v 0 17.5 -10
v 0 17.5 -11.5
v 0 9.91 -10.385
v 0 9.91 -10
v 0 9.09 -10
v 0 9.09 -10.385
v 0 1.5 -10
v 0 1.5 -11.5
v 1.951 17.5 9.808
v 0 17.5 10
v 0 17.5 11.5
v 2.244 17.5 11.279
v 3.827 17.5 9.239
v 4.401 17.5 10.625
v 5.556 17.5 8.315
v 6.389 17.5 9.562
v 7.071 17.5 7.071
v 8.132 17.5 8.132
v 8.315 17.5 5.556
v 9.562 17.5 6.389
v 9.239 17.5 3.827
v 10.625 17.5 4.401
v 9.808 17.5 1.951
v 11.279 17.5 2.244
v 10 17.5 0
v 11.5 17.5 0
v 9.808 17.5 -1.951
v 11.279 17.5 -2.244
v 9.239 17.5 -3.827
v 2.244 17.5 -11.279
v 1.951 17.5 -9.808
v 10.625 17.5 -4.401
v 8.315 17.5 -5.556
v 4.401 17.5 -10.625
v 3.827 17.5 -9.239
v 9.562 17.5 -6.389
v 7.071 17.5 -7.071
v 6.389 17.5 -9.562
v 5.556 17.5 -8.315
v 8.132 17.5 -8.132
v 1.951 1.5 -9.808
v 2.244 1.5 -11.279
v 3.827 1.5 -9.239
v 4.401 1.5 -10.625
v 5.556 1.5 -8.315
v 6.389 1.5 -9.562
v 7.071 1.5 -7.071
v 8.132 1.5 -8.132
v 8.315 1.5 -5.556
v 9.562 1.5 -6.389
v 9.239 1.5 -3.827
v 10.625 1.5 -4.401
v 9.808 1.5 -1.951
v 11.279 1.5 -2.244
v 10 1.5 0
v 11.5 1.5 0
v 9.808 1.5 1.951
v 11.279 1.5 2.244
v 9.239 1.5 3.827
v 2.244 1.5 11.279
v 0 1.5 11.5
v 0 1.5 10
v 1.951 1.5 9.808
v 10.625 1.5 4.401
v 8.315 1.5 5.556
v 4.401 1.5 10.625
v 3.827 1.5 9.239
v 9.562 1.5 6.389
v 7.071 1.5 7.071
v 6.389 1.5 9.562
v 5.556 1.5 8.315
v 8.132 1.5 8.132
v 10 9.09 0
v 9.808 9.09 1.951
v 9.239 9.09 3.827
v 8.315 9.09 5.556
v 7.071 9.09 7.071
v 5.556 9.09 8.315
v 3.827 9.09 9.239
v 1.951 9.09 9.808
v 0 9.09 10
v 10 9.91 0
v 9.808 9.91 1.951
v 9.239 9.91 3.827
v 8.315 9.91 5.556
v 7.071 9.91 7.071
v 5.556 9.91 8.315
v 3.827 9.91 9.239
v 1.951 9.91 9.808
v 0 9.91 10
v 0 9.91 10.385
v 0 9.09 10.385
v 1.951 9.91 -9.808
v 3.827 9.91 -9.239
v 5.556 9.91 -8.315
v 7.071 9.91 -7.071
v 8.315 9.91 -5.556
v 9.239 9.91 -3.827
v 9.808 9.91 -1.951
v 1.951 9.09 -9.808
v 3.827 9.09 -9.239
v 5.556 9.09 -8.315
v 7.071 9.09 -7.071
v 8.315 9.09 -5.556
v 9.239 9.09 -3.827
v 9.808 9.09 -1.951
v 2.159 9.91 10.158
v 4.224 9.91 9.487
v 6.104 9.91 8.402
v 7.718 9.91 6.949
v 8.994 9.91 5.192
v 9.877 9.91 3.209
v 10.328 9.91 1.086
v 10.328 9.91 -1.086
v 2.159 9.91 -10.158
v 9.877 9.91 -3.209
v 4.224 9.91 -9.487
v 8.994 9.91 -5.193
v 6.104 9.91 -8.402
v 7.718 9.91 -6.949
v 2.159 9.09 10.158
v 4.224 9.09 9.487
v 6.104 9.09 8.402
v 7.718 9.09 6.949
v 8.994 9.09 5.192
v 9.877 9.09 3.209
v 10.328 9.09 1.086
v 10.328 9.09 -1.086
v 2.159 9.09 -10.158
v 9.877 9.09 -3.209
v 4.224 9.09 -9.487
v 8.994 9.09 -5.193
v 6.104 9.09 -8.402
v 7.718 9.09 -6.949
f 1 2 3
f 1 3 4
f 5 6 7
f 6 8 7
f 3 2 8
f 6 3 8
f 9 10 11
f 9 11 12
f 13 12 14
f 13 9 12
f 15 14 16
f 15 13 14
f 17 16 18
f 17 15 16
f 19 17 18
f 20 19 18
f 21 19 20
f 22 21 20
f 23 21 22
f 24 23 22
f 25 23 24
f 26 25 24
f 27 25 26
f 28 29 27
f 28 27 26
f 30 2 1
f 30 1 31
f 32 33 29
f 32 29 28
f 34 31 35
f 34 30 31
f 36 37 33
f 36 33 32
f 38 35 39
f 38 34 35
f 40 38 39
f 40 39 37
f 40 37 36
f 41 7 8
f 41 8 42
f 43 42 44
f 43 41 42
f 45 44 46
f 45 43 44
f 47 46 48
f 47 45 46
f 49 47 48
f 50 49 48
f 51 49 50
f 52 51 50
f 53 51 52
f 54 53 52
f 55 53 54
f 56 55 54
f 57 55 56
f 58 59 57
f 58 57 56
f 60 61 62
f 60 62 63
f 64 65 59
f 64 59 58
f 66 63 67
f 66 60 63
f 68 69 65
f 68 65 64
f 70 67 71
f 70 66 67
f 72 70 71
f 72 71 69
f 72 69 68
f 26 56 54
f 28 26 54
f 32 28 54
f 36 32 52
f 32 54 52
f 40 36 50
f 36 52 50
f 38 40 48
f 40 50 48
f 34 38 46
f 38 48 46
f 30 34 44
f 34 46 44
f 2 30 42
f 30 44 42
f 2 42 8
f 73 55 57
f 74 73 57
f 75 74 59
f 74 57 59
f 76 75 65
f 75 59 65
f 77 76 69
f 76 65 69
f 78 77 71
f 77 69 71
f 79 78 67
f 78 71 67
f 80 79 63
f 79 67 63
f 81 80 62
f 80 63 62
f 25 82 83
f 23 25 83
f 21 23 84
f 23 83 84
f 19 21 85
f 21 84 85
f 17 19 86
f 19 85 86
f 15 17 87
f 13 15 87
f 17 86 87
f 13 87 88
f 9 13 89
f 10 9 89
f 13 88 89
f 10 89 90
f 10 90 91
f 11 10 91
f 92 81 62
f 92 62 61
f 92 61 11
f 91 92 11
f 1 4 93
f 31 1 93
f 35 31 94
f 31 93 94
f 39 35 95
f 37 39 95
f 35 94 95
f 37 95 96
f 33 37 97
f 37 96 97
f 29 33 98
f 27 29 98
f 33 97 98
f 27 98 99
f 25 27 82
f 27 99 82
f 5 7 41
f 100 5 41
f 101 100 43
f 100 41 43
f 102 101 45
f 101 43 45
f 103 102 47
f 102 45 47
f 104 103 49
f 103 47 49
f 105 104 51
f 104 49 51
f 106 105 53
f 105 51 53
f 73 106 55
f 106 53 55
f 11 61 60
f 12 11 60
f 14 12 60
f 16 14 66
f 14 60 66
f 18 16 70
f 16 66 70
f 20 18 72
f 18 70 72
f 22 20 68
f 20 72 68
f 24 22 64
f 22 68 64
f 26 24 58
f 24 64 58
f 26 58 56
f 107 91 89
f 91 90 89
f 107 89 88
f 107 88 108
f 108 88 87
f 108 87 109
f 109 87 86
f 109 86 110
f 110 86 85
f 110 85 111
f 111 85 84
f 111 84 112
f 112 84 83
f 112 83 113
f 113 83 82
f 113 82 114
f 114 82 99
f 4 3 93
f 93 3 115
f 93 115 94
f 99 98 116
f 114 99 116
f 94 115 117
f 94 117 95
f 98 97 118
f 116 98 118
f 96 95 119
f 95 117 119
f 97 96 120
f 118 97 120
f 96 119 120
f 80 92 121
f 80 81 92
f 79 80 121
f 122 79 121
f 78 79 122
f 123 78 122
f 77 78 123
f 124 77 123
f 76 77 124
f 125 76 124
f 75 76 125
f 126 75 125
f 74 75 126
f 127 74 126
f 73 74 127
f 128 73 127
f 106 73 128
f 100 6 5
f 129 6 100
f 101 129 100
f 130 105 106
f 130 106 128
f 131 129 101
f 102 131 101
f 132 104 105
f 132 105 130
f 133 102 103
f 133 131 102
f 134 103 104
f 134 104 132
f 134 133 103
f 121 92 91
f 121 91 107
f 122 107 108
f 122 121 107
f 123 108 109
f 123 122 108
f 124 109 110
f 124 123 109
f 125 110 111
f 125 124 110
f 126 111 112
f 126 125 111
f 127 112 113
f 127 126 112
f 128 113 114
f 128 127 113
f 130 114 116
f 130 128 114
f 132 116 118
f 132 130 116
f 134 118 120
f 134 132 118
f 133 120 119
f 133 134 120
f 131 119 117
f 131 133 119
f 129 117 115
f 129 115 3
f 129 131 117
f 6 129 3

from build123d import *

# Parameters (mm, degrees)
BOSS_EXTRUDE1_DEPTH       = 19
CUT_REVOLVE_THIN4_START   = 9.090052714
CUT_REVOLVE_THIN4_DEPTH   = 0.819894572
CUT_REVOLVE_THIN4_START_2 = 9.100052714
CUT_REVOLVE_THIN4_2_DEPTH = 0.799894572
CUT_EXTRUDE1_DEPTH        = 1.5
CUT_EXTRUDE2_START        = -1.5
CUT_EXTRUDE2_DEPTH        = 1.5


with BuildPart() as part:
    # Sketch1 → Boss-Extrude1 (new body)
    with BuildSketch(Plane(origin=(0, 0, 0), x_dir=(1, 0, 0), z_dir=(0, 1, 0))):
        with BuildLine():
            Line((0, -10), (0, -11.5))
            ThreePointArc((0, -11.5), (8.131727984, -8.131727984), (11.5, 0))
            ThreePointArc((11.5, 0), (8.131727984, 8.131727984), (0, 11.5))
            Line((0, 11.5), (0, 10))
            ThreePointArc((0, 10), (7.071067812, 7.071067812), (10, 0))
            ThreePointArc((10, 0), (7.071067812, -7.071067812), (0, -10))
        make_face()
    extrude(amount=BOSS_EXTRUDE1_DEPTH)

    # Cut-Revolve-Thin4: read off the stored shape, not the designer's step
    # Cut-Revolve-Thin4 outline → Cut-Revolve-Thin4 (cut)
    with BuildSketch(Plane(origin=(0, 0, 0), x_dir=(1, 0, 0), z_dir=(0, 1, 0)).offset(CUT_REVOLVE_THIN4_START)):
        with BuildLine():
            ThreePointArc((0, -10.385), (10.385, 0), (0, 10.385))
            Line((0, 10.385), (0, 10))
            ThreePointArc((0, 10), (10, 0), (0, -10))
            Line((0, -10), (0, -10.385))
        make_face()
    extrude(amount=CUT_REVOLVE_THIN4_DEPTH, mode=Mode.SUBTRACT)

    # Sketch3 → Cut-Extrude1 (cut)
    with BuildSketch(Plane.XZ):
        with BuildLine():
            Line((0, 11.5), (0, 10))
            ThreePointArc((0, 10), (10, 0), (0, -10))
            Line((0, -10), (0, -11.5))
            ThreePointArc((0, -11.5), (11.5, 0), (0, 11.5))
        make_face()
    extrude(amount=-CUT_EXTRUDE1_DEPTH, mode=Mode.SUBTRACT)

    # Sketch4 → Cut-Extrude2 (cut)
    with BuildSketch(Plane(origin=(0, 19, 0), x_dir=(1, 0, 0), z_dir=(0, 1, 0)).offset(CUT_EXTRUDE2_START)):
        with BuildLine():
            Line((0, -10), (0, -11.5))
            ThreePointArc((0, -11.5), (11.5, 0), (0, 11.5))
            Line((0, 11.5), (0, 10))
            ThreePointArc((0, 10), (10, 0), (0, -10))
        make_face()
    extrude(amount=CUT_EXTRUDE2_DEPTH, mode=Mode.SUBTRACT)


with BuildPart() as body_2:
    # Cut-Revolve-Thin4 2 outline → Cut-Revolve-Thin4 2 (new body)
    with BuildSketch(Plane(origin=(0, 0, 0), x_dir=(1, 0, 0), z_dir=(0, 1, 0)).offset(CUT_REVOLVE_THIN4_START_2)):
        with BuildLine():
            Line((0, 10.375), (0, 10))
            ThreePointArc((0, 10), (10, 0), (0, -10))
            Line((0, -10), (0, -10.375))
            ThreePointArc((0, -10.375), (10.375, 0), (0, 10.375))
        make_face()
    extrude(amount=CUT_REVOLVE_THIN4_2_DEPTH)


solid = part.part
